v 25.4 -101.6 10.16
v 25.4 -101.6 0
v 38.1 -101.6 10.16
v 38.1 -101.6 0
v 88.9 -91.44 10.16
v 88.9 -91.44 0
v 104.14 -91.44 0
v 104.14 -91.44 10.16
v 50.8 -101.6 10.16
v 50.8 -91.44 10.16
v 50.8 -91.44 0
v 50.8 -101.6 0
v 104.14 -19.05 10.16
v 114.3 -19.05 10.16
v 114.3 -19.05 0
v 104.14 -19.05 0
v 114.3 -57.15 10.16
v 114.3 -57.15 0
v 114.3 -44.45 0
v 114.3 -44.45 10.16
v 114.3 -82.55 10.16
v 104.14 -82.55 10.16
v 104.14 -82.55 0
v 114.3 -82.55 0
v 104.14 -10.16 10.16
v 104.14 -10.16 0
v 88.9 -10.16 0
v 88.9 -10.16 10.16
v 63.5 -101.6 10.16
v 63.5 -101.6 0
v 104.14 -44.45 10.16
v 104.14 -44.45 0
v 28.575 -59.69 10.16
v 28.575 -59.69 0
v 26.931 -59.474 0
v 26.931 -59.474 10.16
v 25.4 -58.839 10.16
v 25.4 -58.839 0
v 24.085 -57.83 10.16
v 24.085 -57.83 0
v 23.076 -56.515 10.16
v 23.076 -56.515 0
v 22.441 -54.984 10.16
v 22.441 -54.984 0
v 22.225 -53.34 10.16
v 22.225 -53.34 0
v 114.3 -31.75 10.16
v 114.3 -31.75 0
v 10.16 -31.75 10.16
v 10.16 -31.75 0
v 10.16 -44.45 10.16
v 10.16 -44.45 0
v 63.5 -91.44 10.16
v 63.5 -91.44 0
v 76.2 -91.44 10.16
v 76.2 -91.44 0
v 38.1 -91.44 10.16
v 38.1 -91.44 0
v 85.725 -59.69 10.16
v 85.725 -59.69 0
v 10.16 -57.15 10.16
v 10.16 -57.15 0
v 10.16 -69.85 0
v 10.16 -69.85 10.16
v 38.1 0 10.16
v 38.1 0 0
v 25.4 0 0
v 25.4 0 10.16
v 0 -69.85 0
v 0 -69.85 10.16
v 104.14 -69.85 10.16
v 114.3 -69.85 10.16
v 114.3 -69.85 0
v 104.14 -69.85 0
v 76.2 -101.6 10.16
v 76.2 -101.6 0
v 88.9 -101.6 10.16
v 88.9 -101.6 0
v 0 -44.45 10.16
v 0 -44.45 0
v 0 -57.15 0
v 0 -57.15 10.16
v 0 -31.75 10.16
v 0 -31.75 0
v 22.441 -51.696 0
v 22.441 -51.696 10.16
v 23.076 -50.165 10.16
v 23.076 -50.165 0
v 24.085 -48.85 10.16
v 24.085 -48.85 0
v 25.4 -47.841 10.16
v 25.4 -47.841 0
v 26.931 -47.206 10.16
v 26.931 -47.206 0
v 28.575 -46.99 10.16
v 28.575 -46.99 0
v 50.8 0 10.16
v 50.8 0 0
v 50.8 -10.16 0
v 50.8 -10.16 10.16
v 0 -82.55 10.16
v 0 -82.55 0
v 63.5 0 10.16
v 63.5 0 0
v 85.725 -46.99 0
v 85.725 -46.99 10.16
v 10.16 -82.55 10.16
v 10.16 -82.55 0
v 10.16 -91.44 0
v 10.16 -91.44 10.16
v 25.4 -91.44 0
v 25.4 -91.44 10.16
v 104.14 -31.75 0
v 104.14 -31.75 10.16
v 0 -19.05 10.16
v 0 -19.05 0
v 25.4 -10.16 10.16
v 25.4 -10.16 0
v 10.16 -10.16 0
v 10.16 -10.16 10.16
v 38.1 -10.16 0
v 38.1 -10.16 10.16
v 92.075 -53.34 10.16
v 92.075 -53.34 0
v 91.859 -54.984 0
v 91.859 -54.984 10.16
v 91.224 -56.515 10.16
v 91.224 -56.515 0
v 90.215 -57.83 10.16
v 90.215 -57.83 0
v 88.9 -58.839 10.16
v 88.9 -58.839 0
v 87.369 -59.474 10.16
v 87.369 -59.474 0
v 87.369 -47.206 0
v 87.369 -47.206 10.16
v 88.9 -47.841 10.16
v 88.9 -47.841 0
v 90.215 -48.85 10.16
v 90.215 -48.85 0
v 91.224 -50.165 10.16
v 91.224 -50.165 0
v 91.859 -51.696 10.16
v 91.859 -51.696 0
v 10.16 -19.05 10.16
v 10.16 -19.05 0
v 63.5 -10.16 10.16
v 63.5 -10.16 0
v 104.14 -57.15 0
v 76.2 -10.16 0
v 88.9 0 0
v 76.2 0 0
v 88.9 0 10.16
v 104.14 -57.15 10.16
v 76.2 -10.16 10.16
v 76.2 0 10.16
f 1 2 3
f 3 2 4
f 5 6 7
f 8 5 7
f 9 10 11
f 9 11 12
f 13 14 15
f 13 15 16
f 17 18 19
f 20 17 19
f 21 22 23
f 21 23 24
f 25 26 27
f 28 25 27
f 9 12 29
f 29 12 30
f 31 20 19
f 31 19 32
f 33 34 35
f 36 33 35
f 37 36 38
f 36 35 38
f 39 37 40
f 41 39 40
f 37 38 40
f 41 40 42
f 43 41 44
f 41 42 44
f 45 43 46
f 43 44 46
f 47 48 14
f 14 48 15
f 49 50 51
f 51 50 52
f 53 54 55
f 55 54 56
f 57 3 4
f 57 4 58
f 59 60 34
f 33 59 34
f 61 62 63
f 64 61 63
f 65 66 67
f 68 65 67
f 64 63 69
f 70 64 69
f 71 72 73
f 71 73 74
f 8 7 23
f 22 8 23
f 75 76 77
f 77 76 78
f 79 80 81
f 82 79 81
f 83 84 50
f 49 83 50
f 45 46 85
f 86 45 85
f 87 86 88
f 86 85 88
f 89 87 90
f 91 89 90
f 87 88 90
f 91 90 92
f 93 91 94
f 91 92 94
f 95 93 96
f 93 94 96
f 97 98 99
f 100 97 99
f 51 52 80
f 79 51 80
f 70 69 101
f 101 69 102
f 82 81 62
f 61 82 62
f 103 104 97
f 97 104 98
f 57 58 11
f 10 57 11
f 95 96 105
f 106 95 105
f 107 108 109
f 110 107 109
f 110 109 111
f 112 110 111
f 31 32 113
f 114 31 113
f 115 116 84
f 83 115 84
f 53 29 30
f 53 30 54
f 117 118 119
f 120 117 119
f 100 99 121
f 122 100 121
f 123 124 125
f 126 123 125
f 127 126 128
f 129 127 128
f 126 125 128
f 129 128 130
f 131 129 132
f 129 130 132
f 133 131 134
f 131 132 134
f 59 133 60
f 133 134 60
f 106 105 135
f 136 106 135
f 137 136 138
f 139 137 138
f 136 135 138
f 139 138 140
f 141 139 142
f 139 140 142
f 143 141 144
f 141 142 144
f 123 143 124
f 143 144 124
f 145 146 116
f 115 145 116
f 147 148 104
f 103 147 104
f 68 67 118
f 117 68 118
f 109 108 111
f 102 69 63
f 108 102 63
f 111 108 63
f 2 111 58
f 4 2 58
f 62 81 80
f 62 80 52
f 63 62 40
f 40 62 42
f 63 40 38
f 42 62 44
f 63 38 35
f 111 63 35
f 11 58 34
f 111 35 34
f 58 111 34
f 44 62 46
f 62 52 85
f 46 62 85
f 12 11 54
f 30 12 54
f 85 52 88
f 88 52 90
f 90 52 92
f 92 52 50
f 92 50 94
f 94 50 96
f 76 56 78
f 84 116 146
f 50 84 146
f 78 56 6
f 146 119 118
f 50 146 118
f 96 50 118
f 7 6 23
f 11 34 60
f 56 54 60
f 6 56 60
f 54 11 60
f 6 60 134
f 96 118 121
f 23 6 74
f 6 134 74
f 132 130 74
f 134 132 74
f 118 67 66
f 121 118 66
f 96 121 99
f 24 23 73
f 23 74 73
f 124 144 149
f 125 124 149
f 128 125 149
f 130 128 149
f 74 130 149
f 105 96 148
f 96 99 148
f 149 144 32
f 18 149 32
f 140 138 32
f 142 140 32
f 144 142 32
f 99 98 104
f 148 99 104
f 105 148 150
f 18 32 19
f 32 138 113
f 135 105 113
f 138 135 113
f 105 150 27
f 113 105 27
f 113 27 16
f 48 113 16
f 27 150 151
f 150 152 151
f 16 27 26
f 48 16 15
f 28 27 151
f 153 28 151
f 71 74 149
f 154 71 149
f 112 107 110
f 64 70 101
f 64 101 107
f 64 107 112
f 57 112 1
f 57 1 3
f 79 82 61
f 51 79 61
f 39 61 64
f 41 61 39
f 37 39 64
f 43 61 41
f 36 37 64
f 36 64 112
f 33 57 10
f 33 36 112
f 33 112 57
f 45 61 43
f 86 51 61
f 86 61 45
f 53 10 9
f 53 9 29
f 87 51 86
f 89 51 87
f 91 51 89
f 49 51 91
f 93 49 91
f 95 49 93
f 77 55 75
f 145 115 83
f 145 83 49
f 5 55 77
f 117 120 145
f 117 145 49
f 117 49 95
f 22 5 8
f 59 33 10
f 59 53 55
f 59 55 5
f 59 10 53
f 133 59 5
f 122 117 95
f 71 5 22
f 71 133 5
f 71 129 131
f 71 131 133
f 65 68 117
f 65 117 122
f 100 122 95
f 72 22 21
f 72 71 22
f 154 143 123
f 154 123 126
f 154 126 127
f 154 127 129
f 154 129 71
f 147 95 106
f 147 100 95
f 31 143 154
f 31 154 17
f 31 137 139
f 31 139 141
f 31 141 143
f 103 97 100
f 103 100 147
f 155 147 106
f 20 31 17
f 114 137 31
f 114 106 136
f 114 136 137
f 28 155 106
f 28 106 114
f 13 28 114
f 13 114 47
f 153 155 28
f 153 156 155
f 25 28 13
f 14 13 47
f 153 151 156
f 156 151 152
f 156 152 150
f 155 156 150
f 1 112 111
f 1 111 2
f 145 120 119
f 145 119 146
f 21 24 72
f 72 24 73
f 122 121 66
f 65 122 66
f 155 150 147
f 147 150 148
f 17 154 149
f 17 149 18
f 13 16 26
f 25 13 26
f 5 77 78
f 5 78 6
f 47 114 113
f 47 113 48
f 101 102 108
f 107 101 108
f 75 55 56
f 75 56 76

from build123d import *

# Parameters (mm, degrees)
F1_DEPTH = 10.16


with BuildPart() as f1:
    # F0 (on Top) → F1 (new body)
    with BuildSketch(Plane.XY):
        Polygon((38.1, 0), (25.4, 0), (25.4, -10.16), (10.16, -10.16), (10.16, -19.05), (0, -19.05), (0, -31.75), (10.16, -31.75), (10.16, -44.45), (0, -44.45), (0, -57.15), (10.16, -57.15), (10.16, -69.85), (0, -69.85), (0, -82.55), (10.16, -82.55), (10.16, -91.44), (25.4, -91.44), (25.4, -101.6), (38.1, -101.6), (38.1, -91.44), (50.8, -91.44), (50.8, -101.6), (63.5, -101.6), (63.5, -91.44), (76.2, -91.44), (76.2, -101.6), (88.9, -101.6), (88.9, -91.44), (104.14, -91.44), (104.14, -82.55), (114.3, -82.55), (114.3, -69.85), (104.14, -69.85), (104.14, -57.15), (114.3, -57.15), (114.3, -44.45), (104.14, -44.45), (104.14, -31.75), (114.3, -31.75), (114.3, -19.05), (104.14, -19.05), (104.14, -10.16), (88.9, -10.16), (88.9, 0), (76.2, 0), (76.2, -10.16), (63.5, -10.16), (63.5, 0), (50.8, 0), (50.8, -10.16), (38.1, -10.16), align=None)
        with BuildLine():
            ThreePointArc((22.225, -53.34), (24.084872, -48.849872), (28.575, -46.99))
            Line((28.575, -46.99), (85.725, -46.99))
            ThreePointArc((85.725, -46.99), (90.215128, -48.849872), (92.075, -53.34))
            ThreePointArc((92.075, -53.34), (90.215128, -57.830128), (85.725, -59.69))
            Line((85.725, -59.69), (28.575, -59.69))
            ThreePointArc((28.575, -59.69), (24.084872, -57.830128), (22.225, -53.34))
        make_face(mode=Mode.SUBTRACT)
    extrude(amount=F1_DEPTH)


solid = f1.part
